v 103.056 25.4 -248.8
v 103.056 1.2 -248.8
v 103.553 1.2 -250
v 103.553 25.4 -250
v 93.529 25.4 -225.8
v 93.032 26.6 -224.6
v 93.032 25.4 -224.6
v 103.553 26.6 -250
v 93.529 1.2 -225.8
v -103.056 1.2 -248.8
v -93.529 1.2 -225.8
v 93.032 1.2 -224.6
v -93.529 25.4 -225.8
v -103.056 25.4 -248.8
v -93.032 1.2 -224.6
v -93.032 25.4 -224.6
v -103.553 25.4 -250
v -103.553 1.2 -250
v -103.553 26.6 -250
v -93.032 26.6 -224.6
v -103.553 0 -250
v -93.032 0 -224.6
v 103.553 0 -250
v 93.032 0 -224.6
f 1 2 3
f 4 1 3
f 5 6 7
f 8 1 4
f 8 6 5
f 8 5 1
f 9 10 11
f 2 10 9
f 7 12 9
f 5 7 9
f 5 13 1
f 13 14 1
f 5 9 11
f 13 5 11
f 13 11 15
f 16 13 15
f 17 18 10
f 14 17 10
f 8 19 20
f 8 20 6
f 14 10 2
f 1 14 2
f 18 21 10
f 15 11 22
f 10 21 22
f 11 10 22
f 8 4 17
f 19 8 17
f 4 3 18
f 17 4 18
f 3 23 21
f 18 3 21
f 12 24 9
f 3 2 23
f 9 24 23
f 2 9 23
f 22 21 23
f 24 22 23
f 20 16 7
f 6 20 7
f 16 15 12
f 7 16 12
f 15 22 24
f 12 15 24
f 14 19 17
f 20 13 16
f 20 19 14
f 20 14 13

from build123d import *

# Parameters (mm, degrees)
BOSS_EXTRUDE1_DEPTH = 1.2
BOSS_EXTRUDE2_START = 25.4
BOSS_EXTRUDE2_DEPTH = 1.2
BOSS_EXTRUDE3_DEPTH = 24.2


with BuildPart() as part:
    # Sketch1 → Boss-Extrude1 (new body)
    with BuildSketch(Plane(origin=(0, 0, 0), x_dir=(1, 0, 0), z_dir=(0, 1, 0))):
        Polygon((-103.553390593, 250), (-93.032366109, 224.6), (93.032366109, 224.6), (103.553390593, 250), align=None)
    extrude(amount=BOSS_EXTRUDE1_DEPTH)



with BuildPart() as body_2:
    # Sketch2 → Boss-Extrude2 (new body)
    with BuildSketch(Plane(origin=(0, 1.2, 0), x_dir=(1, 0, 0), z_dir=(0, 1, 0)).offset(BOSS_EXTRUDE2_START)):
        Polygon((93.032366109, 224.6), (103.553390593, 250), (-103.553390593, 250), (-93.032366109, 224.6), align=None)
    extrude(amount=-BOSS_EXTRUDE2_DEPTH)


with BuildPart() as part_1:
    add(part.part)

    add(body_2.part)  # Boss-Extrude3 merges body 2
    # Sketch3 → Boss-Extrude3 (add)
    with BuildSketch(Plane(origin=(0, 1.2, 0), x_dir=(1, 0, 0), z_dir=(0, 1, 0))):
        Polygon((93.032366109, 224.6), (93.529422384, 225.8), (-93.529422384, 225.8), (-93.032366109, 224.6), align=None)
        Polygon((-103.553390593, 250), (-103.056334318, 248.8), (103.056334318, 248.8), (103.553390593, 250), align=None)
    extrude(amount=BOSS_EXTRUDE3_DEPTH)


solid = part_1.part
